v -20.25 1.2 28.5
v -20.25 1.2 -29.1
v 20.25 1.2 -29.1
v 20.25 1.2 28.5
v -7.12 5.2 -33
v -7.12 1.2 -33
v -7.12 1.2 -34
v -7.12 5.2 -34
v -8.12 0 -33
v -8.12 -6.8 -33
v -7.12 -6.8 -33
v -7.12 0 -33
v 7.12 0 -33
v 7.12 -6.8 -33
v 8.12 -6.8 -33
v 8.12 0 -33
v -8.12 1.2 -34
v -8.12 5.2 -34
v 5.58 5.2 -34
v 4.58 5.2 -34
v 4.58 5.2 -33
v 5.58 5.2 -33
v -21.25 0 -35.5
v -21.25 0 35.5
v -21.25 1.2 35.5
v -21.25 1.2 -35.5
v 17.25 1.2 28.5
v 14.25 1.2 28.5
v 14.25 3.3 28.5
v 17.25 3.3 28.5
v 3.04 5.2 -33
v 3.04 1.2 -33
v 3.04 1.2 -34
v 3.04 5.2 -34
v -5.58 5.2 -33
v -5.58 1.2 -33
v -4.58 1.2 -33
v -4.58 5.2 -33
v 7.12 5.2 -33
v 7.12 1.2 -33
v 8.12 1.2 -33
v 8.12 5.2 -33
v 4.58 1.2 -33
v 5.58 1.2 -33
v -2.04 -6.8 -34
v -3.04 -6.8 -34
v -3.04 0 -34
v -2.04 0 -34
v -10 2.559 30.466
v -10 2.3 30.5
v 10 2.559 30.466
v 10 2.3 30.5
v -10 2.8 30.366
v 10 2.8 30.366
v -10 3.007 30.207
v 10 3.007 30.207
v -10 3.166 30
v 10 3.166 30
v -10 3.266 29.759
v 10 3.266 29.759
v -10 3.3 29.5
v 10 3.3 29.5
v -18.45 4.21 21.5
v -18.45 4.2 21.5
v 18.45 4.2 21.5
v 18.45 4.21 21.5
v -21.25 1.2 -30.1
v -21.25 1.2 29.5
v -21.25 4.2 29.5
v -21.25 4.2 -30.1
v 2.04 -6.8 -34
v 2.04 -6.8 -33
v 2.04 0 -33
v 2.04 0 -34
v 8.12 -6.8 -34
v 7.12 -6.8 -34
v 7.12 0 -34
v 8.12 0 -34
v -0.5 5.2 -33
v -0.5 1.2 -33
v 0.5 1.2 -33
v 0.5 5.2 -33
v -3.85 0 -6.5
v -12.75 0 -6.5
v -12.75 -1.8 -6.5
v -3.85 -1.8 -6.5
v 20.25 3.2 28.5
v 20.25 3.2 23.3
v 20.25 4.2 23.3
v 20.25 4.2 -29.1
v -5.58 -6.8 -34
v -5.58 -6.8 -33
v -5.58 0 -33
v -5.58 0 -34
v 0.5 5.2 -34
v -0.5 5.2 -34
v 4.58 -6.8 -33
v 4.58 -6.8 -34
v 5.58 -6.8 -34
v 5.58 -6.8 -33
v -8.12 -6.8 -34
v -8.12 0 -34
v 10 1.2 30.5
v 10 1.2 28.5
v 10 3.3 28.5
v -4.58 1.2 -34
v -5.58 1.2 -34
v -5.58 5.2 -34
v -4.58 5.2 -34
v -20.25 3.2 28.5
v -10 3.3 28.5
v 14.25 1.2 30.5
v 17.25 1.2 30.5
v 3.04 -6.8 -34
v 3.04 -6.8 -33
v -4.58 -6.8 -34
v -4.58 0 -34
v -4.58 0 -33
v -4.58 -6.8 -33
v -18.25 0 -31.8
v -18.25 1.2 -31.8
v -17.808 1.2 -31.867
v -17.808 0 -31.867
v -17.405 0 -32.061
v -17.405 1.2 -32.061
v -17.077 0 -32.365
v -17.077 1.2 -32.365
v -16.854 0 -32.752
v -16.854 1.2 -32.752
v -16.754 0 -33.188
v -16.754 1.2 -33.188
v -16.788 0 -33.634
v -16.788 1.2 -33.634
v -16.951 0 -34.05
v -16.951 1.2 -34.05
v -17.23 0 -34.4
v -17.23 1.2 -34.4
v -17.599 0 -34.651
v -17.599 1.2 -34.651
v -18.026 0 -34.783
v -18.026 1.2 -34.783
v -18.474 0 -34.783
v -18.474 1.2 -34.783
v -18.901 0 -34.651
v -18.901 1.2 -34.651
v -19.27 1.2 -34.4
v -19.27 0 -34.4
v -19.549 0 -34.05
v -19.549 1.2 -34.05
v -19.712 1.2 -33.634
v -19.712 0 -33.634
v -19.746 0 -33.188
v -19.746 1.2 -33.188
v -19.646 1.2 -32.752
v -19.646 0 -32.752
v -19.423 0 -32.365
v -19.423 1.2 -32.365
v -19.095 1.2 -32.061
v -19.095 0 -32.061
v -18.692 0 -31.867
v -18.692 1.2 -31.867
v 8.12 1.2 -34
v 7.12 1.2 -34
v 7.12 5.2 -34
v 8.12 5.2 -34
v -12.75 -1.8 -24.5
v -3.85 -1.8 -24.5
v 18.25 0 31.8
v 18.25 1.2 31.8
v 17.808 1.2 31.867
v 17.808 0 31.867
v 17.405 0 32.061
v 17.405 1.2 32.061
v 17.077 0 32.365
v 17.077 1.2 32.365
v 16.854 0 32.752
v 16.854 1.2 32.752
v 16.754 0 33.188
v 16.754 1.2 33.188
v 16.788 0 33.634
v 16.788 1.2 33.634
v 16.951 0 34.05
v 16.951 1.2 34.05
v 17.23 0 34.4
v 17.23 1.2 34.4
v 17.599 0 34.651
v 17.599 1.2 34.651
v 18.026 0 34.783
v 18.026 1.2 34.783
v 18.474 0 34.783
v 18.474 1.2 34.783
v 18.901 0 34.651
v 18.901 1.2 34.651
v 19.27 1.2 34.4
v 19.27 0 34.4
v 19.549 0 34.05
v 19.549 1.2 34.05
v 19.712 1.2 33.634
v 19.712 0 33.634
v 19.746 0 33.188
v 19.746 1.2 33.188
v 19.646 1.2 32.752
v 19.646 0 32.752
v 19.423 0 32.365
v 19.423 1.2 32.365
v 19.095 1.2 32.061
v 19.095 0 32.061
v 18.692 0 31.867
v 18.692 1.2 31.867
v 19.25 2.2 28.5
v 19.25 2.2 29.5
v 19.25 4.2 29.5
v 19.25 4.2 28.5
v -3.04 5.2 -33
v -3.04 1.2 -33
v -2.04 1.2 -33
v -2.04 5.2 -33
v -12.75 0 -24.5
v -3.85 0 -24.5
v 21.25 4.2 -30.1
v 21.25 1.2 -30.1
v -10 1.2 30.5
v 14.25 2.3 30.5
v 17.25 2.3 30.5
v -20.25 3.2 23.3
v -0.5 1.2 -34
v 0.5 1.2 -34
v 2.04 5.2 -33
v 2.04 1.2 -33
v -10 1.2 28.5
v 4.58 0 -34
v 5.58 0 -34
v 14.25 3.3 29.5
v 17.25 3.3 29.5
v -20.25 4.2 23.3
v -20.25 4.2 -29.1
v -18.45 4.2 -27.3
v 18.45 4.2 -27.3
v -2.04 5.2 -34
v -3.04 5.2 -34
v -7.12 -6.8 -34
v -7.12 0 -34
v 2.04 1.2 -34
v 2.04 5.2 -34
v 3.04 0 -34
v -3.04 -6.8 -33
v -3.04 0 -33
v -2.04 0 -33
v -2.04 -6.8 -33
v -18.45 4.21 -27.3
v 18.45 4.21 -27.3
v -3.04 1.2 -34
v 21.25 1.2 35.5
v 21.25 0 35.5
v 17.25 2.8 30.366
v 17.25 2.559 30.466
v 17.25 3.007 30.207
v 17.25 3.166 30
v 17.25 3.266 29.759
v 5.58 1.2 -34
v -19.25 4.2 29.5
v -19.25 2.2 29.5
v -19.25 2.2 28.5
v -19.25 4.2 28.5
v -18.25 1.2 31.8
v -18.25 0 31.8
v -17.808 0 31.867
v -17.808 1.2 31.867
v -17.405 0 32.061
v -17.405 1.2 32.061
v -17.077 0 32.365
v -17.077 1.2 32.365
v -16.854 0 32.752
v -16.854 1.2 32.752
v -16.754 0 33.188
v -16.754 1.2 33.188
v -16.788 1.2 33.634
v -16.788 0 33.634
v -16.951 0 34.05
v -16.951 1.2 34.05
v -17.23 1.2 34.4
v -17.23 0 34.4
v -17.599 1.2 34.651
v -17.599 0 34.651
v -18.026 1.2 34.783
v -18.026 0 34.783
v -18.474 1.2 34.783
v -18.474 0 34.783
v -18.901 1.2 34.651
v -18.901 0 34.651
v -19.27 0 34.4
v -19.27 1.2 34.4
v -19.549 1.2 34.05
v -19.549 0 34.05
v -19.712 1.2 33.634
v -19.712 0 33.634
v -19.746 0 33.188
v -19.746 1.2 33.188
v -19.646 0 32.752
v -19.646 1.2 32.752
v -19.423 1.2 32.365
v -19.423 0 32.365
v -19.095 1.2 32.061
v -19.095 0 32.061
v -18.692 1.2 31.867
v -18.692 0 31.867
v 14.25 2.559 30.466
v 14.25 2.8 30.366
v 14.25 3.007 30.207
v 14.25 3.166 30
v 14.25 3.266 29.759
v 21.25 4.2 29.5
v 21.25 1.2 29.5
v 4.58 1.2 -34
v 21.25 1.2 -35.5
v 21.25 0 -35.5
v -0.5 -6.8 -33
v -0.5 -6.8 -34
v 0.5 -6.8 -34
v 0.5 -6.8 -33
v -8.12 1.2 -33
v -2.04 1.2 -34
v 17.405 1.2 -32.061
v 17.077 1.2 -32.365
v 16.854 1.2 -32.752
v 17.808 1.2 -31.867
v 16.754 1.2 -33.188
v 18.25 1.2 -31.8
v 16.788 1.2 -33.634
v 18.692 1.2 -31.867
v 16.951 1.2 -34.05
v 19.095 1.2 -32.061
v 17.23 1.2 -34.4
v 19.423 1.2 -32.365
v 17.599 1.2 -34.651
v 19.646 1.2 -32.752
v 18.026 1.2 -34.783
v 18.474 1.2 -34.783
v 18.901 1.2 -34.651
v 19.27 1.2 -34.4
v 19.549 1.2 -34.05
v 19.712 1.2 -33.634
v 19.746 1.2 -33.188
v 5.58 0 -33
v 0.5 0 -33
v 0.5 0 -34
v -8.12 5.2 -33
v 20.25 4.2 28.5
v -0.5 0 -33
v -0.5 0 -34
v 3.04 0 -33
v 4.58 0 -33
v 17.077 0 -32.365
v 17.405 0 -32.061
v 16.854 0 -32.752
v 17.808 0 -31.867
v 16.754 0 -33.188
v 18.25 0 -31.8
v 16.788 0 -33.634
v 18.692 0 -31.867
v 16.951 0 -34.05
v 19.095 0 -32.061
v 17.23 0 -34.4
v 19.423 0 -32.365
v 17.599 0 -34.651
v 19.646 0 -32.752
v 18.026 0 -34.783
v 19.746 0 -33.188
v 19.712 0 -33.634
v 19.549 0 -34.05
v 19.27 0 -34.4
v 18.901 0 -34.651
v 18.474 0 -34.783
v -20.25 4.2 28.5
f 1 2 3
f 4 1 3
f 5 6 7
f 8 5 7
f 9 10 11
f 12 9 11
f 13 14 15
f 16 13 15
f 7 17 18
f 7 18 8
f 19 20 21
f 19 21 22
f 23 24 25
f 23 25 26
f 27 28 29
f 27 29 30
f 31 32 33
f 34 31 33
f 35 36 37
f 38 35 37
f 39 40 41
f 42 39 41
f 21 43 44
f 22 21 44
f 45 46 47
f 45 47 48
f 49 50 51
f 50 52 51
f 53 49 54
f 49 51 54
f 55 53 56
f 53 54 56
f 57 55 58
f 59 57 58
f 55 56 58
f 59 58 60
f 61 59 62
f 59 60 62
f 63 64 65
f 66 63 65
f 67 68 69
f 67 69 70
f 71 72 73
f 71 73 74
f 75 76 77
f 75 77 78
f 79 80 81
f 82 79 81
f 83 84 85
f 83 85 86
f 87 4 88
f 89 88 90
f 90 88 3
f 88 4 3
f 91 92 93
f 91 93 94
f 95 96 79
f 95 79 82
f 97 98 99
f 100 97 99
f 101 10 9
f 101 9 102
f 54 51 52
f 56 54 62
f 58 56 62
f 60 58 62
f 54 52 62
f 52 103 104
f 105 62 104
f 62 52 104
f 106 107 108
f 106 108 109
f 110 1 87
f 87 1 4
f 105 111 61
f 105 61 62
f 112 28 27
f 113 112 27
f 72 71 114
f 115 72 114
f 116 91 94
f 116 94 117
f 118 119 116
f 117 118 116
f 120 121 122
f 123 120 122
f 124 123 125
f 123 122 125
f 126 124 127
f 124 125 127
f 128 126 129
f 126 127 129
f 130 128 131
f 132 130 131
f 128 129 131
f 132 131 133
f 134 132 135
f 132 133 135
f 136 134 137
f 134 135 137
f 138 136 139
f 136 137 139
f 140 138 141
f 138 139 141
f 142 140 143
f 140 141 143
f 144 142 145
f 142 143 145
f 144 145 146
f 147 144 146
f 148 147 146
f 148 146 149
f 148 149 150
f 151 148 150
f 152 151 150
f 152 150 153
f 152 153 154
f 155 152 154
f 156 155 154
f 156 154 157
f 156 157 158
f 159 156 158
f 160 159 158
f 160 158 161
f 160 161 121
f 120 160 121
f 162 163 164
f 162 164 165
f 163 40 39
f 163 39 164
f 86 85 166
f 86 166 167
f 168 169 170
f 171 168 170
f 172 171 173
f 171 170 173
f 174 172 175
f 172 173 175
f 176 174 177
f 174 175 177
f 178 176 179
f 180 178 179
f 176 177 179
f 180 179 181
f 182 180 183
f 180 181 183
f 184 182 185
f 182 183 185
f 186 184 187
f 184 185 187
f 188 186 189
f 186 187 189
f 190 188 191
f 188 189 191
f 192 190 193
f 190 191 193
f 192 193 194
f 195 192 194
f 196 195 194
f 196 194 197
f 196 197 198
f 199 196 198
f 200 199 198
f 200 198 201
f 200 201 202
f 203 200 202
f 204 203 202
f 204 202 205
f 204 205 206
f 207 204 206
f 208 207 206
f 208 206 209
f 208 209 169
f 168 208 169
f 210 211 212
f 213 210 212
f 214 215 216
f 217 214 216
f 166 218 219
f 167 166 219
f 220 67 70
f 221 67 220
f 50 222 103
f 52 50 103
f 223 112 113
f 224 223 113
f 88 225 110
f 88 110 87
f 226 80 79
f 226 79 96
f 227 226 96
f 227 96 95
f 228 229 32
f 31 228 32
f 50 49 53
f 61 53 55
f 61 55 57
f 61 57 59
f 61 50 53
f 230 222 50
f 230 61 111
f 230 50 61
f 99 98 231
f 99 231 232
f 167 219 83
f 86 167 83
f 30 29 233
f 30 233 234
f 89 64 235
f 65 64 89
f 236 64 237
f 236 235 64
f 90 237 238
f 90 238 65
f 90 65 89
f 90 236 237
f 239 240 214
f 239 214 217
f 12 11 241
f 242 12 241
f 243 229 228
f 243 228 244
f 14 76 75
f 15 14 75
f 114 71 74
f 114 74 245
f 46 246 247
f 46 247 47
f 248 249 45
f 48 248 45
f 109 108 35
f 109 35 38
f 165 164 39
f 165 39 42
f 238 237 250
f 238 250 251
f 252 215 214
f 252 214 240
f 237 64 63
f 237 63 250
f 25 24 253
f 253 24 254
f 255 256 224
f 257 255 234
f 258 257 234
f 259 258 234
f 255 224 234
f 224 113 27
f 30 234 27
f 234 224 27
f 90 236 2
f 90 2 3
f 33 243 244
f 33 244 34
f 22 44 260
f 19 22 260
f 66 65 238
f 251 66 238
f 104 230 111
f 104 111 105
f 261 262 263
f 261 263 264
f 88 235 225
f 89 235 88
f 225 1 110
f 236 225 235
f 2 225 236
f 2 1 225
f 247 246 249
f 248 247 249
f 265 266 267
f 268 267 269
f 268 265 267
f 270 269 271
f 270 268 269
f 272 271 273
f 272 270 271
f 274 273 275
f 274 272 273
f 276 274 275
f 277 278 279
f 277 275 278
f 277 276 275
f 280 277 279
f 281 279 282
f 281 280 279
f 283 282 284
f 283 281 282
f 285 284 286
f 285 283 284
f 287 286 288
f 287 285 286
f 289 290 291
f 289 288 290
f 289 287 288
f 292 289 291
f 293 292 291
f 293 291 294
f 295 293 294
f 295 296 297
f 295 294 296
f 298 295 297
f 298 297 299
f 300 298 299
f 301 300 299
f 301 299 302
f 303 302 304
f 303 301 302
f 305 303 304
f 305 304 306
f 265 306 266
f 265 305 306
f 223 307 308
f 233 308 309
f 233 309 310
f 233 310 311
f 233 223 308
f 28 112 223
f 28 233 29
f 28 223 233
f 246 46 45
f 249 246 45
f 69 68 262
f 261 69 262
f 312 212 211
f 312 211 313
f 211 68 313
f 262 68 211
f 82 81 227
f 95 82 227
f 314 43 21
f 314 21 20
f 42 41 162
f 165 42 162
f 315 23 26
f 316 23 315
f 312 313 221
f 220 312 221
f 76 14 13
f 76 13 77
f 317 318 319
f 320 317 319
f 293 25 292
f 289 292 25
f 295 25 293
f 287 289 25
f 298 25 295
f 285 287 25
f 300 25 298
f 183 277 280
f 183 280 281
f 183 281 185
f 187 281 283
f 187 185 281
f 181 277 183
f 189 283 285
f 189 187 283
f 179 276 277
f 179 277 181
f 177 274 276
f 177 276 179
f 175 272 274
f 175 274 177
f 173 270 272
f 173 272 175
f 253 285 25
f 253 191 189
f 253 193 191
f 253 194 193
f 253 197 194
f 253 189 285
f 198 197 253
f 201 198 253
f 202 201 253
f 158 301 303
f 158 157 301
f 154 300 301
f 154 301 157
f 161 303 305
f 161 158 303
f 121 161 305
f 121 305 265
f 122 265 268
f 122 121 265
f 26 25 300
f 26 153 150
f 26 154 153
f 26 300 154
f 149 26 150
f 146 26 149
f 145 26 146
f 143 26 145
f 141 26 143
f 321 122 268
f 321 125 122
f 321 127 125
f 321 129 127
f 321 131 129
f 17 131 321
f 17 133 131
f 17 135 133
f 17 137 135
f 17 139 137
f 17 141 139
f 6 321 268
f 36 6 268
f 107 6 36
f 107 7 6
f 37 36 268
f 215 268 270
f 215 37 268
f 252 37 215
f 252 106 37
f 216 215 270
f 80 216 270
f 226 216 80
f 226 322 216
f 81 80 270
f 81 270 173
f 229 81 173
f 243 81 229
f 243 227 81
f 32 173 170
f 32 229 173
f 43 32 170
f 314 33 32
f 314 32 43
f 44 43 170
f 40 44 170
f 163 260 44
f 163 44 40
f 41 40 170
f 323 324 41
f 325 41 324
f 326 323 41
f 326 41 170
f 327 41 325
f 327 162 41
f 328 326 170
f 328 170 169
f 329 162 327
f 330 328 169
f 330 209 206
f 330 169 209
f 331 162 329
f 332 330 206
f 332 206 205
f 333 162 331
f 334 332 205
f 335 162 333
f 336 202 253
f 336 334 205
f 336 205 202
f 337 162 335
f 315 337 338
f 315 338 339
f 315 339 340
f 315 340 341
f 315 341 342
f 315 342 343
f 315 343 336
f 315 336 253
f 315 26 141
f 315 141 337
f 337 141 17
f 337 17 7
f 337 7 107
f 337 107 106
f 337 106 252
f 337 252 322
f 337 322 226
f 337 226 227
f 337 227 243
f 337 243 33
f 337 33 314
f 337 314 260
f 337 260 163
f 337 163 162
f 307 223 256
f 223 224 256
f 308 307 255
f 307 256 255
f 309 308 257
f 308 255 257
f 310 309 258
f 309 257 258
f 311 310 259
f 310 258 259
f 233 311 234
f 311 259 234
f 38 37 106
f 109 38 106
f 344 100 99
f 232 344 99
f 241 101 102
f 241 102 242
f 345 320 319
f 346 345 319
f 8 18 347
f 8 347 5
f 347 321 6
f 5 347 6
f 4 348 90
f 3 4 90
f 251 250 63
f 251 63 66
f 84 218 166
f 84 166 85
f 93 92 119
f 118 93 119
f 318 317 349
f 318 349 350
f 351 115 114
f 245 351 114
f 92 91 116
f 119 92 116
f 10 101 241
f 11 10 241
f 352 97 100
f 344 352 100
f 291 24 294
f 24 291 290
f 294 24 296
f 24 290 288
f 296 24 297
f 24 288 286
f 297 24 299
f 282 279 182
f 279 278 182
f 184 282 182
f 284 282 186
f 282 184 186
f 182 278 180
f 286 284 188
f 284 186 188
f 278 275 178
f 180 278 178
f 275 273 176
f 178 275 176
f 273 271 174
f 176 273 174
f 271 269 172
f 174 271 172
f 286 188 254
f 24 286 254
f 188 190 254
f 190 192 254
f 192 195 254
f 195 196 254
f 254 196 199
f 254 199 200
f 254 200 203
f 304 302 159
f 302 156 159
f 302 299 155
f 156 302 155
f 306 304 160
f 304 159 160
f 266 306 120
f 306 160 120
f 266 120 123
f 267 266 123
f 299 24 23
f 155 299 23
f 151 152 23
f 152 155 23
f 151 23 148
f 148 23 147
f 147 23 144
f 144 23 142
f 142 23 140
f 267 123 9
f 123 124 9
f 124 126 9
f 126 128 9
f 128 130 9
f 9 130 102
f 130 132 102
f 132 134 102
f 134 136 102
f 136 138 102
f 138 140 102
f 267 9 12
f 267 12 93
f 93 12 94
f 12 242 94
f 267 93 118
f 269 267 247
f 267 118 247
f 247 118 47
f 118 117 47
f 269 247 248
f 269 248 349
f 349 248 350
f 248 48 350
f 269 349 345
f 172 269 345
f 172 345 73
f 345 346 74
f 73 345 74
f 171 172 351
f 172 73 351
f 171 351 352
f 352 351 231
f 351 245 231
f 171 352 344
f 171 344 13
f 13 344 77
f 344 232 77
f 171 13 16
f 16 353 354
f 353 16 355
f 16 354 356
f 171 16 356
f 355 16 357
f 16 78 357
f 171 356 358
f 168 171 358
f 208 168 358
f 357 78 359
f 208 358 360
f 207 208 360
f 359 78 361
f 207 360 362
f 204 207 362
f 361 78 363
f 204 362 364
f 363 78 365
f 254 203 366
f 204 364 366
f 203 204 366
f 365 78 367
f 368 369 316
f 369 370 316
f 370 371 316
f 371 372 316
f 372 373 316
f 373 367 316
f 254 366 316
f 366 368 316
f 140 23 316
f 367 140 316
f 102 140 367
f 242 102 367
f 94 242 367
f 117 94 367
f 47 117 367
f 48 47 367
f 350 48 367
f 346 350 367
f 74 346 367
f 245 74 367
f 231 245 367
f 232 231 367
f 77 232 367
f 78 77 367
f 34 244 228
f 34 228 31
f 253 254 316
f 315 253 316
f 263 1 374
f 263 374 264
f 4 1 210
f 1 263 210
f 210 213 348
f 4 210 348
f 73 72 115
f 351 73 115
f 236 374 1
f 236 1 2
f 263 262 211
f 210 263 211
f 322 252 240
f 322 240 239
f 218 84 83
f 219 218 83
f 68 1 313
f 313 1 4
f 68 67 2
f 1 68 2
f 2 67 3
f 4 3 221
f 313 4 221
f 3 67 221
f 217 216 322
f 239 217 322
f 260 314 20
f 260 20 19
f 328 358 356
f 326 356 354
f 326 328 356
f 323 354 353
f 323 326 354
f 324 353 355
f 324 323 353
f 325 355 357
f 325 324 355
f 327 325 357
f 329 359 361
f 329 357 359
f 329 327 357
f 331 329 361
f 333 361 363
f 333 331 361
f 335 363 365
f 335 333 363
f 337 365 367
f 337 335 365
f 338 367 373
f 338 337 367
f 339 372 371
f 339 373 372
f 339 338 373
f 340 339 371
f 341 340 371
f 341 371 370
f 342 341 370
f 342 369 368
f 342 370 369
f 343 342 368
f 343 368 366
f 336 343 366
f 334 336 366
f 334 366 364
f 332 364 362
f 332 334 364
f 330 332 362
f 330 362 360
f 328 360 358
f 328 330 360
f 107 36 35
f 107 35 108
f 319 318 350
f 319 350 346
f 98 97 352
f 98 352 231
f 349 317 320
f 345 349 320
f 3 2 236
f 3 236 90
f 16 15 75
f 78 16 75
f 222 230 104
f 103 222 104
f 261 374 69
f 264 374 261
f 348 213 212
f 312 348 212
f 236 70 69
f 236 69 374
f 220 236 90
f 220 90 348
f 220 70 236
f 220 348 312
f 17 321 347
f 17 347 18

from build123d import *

# Parameters (mm, degrees)
SKETCH1_W                                  = 42.5
SKETCH1_H                                  = 71
BOSS_EXTRUDE1_DEPTH                        = 1.2
SKETCH7_R                                  = 1.5
CUT_EXTRUDE2_DEPTH                         = 42.391454432
MIRROR1_AT_THE_SECOND_PLANE_COPY_1_SKETC_R = 1.5
MIRROR1_AT_THE_SECOND_PLANE_COPY_1_DEPTH   = 42.391454432
BOSS_EXTRUDE5_START                        = -8
SKETCH8_W                                  = 1
SKETCH8_H                                  = 1
BOSS_EXTRUDE5_DEPTH                        = 12
LPATTERN1_COUNT                            = 4
LPATTERN1_PITCH                            = 2.54
LPATTERN1_COL_COUNT                        = 4
LPATTERN1_COL_PITCH                        = 2.54
SKETCH10_W                                 = 8.9
SKETCH10_H                                 = 18
PCB_COMPONENTS_DEPTH                       = 1.8
SKETCH2_W                                  = 42.5
SKETCH2_H                                  = 59.6
BOSS_EXTRUDE2_DEPTH                        = 3
SKETCH3_W                                  = 40.5
SKETCH3_H                                  = 57.6
CUT_EXTRUDE1_DEPTH                         = 43.811359474
SKETCH12_W                                 = 38.5
SKETCH12_H                                 = 2
CUT_EXTRUDE4_DEPTH                         = 1
SKETCH5_W                                  = 40.5
SKETCH5_H                                  = 57.6
BOSS_EXTRUDE3_DEPTH                        = 3
SKETCH9_W                                  = 40.5
SKETCH9_H                                  = 5.2
CUT_EXTRUDE3_DEPTH                         = 1
SKETCH6_W                                  = 36.9
SKETCH6_H                                  = 48.8
BOSS_EXTRUDE4_DEPTH                        = 0.01
SKETCH11_W                                 = 20
SKETCH11_H                                 = 2
BOSS_EXTRUDE7_DEPTH                        = 2.1
SKETCH11_W_2                               = 3
BOSS_EXTRUDE7_2_DEPTH                      = 2.1
FILLET1_R                                  = 1
FILLET2_R                                  = 1


with BuildPart() as part:
    # Sketch1 → Boss-Extrude1 (new body)
    with BuildSketch(Plane(origin=(0, 0, 0), x_dir=(1, 0, 0), z_dir=(0, 1, 0))):
        Rectangle(SKETCH1_W, SKETCH1_H)
    extrude(amount=BOSS_EXTRUDE1_DEPTH)

    # Sketch7 → Cut-Extrude2 (cut, through all)
    with BuildSketch(Plane(origin=(0, 1.2, 0), x_dir=(1, 0, 0), z_dir=(0, 1, 0))):
        with Locations(Location((-18.25, 33.3, 0), (0, 0, 270))):
            Circle(SKETCH7_R)
    cut_extrude2 = extrude(amount=-CUT_EXTRUDE2_DEPTH, mode=Mode.SUBTRACT)

    # Mirror1: Cut-Extrude2 across plane
    add(cut_extrude2.mirror(Plane.XY), mode=Mode.SUBTRACT)

    # Mirror1 at the second plane: Cut-Extrude2 across plane
    add(cut_extrude2.mirror(Plane(origin=(0, 0, 0), x_dir=(0, 0, 1), z_dir=(1, 0, 0))), mode=Mode.SUBTRACT)

    # Mirror1 at the second plane copy 1 sketc → Mirror1 at the second plane copy 1 (cut, through all)
    with BuildSketch(Plane(origin=(0, 1.2, 0), x_dir=(-1, 0, 0), z_dir=(0, 1, 0))):
        with Locations(Location((-18.25, 33.3, 0), (0, 0, 270))):
            Circle(MIRROR1_AT_THE_SECOND_PLANE_COPY_1_SKETC_R)
    extrude(amount=-MIRROR1_AT_THE_SECOND_PLANE_COPY_1_DEPTH, mode=Mode.SUBTRACT)

    # Sketch8 → Boss-Extrude5 (add)
    with BuildSketch(Plane(origin=(0, 1.2, 0), x_dir=(1, 0, 0), z_dir=(0, 1, 0)).offset(BOSS_EXTRUDE5_START)):
        with Locations((0, 33.5)):
            Rectangle(SKETCH8_W, SKETCH8_H)
    boss_extrude5 = extrude(amount=BOSS_EXTRUDE5_DEPTH)

    # LPattern1: Boss-Extrude5 ×4
    with Locations(*[(i * LPATTERN1_PITCH, 0, 0) for i in range(1, LPATTERN1_COUNT)]):
        add(boss_extrude5)

    # LPattern1 col: Boss-Extrude5 ×4
    with Locations(*[(-i * LPATTERN1_COL_PITCH, 0, 0) for i in range(1, LPATTERN1_COL_COUNT)]):
        add(boss_extrude5)


with BuildPart() as body_2:
    # Sketch10 → PCB components (new body)
    with BuildSketch(Plane.XZ):
        with Locations((-8.3, -15.5)):
            Rectangle(SKETCH10_W, SKETCH10_H)
    extrude(amount=PCB_COMPONENTS_DEPTH)


with BuildPart() as body_3:
    # Sketch2 → Boss-Extrude2 (new body)
    with BuildSketch(Plane(origin=(0, 1.2, 0), x_dir=(1, 0, 0), z_dir=(0, 1, 0))):
        with Locations((0, 0.3)):
            Rectangle(SKETCH2_W, SKETCH2_H)
    extrude(amount=BOSS_EXTRUDE2_DEPTH)

    # Sketch3 → Cut-Extrude1 (cut, through all)
    with BuildSketch(Plane(origin=(0, 4.2, 0), x_dir=(1, 0, 0), z_dir=(0, 1, 0))):
        with Locations((0, 0.3)):
            Rectangle(SKETCH3_W, SKETCH3_H)
    extrude(amount=-CUT_EXTRUDE1_DEPTH, mode=Mode.SUBTRACT)

    # Sketch12 → Cut-Extrude4 (cut)
    with BuildSketch(Plane.XY.offset(29.5)):
        with Locations((0, 3.2)):
            Rectangle(SKETCH12_W, SKETCH12_H)
    extrude(amount=-CUT_EXTRUDE4_DEPTH, mode=Mode.SUBTRACT)


with BuildPart() as body_4:
    # Sketch5 → Boss-Extrude3 (new body)
    with BuildSketch(Plane(origin=(0, 1.2, 0), x_dir=(1, 0, 0), z_dir=(0, 1, 0))):
        with Locations((0, 0.3)):
            Rectangle(SKETCH5_W, SKETCH5_H)
    extrude(amount=BOSS_EXTRUDE3_DEPTH)

    # Sketch9 → Cut-Extrude3 (cut)
    with BuildSketch(Plane(origin=(0, 4.2, 0), x_dir=(1, 0, 0), z_dir=(0, 1, 0))):
        with Locations((0, -25.9)):
            Rectangle(SKETCH9_W, SKETCH9_H)
    extrude(amount=-CUT_EXTRUDE3_DEPTH, mode=Mode.SUBTRACT)

    # Sketch6 → Boss-Extrude4 (add)
    with BuildSketch(Plane(origin=(0, 4.2, 0), x_dir=(1, 0, 0), z_dir=(0, 1, 0))):
        with Locations((0, 2.9)):
            Rectangle(SKETCH6_W, SKETCH6_H)
    extrude(amount=BOSS_EXTRUDE4_DEPTH)


with BuildPart() as body_5:
    # Sketch11 → Boss-Extrude7 (new body)
    with BuildSketch(Plane(origin=(0, 1.2, 0), x_dir=(1, 0, 0), z_dir=(0, 1, 0))):
        with Locations((0, -29.5)):
            Rectangle(SKETCH11_W, SKETCH11_H)
    extrude(amount=BOSS_EXTRUDE7_DEPTH)

    # Fillet1
    fillet1_edges = [body_5.edges().sort_by_distance(p)[0] for p in [
        (0, 3.3, 30.5),
    ]]
    fillet(fillet1_edges, radius=FILLET1_R)


with BuildPart() as body_6:
    # Sketch11 → Boss-Extrude7 2 (new body)
    with BuildSketch(Plane(origin=(0, 1.2, 0), x_dir=(1, 0, 0), z_dir=(0, 1, 0))):
        with Locations((15.75, -29.5)):
            Rectangle(SKETCH11_W_2, SKETCH11_H)
    extrude(amount=BOSS_EXTRUDE7_2_DEPTH)

    # Fillet2
    fillet2_edges = [body_6.edges().sort_by_distance(p)[0] for p in [
        (15.75, 3.3, 30.5),
    ]]
    fillet(fillet2_edges, radius=FILLET2_R)


solid = Compound([part.part, body_2.part, body_3.part, body_4.part, body_5.part, body_6.part])
